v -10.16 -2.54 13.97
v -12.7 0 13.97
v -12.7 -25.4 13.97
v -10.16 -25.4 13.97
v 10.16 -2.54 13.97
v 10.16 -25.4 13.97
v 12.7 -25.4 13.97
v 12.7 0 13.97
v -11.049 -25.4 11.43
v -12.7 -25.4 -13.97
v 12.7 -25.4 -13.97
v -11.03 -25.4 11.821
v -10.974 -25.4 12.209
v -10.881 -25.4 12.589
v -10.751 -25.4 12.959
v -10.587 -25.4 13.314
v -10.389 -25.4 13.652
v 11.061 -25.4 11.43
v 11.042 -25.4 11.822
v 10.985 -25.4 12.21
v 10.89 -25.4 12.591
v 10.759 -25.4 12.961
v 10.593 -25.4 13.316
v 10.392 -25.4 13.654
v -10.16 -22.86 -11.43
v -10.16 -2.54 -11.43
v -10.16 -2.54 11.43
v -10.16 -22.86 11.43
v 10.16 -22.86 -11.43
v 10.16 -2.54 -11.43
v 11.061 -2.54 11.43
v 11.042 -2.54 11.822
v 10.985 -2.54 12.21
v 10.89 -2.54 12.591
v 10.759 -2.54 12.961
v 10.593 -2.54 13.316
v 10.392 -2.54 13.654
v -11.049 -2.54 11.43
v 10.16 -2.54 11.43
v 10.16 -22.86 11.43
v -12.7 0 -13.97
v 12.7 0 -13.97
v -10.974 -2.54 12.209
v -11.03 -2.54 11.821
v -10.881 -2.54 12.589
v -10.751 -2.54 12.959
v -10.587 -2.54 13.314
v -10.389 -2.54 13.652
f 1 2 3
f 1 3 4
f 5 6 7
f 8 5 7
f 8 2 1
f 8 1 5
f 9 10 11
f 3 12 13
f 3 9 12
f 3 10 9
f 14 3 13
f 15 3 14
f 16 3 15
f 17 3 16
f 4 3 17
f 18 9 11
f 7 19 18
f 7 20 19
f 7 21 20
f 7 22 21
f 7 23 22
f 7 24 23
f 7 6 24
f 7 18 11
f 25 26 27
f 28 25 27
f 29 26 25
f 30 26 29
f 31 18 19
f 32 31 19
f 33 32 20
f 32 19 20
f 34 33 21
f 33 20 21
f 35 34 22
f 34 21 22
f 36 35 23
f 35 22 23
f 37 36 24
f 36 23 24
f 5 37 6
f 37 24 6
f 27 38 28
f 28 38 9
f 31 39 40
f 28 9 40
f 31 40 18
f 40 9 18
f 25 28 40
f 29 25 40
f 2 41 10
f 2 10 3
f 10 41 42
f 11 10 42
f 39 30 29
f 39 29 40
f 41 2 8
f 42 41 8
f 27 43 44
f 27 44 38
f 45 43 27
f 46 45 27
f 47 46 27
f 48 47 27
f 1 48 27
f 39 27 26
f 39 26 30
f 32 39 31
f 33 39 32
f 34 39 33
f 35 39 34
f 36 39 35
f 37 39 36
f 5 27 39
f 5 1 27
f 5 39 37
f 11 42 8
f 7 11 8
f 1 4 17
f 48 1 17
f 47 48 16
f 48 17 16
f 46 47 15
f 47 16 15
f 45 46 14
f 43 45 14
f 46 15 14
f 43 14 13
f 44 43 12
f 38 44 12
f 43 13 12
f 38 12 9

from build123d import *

# Parameters (mm, degrees)
F0_W     = 25.4
F0_H     = 27.94
F1_DEPTH = 25.4
F2_T     = -2.54
F4_DEPTH = 22.86


with BuildPart() as f1:
    # F0 (on Front) → F1 (new body)
    with BuildSketch(Plane.XZ):
        Rectangle(F0_W, F0_H)
    extrude(amount=F1_DEPTH)

    # F2
    f2_openings = [f1.faces().sort_by_distance(p)[0] for p in [
        (0, -12.7, 13.97),
    ]]
    offset(amount=F2_T, openings=f2_openings)

    # F3 (on face) → F4 (cut)
    with BuildSketch(Plane.XZ.offset(25.4)):
        with BuildLine():
            Line((-11.049, 11.43), (11.061186, 11.43))
            ThreePointArc((11.061186, 11.43), (10.829213, 12.777566), (10.16, 13.97))
            Line((10.16, 13.97), (-10.16, 13.97))
            ThreePointArc((-10.16, 13.97), (-10.820331, 12.775541), (-11.049, 11.43))
        make_face()
    extrude(amount=-F4_DEPTH, mode=Mode.SUBTRACT)


solid = f1.part
